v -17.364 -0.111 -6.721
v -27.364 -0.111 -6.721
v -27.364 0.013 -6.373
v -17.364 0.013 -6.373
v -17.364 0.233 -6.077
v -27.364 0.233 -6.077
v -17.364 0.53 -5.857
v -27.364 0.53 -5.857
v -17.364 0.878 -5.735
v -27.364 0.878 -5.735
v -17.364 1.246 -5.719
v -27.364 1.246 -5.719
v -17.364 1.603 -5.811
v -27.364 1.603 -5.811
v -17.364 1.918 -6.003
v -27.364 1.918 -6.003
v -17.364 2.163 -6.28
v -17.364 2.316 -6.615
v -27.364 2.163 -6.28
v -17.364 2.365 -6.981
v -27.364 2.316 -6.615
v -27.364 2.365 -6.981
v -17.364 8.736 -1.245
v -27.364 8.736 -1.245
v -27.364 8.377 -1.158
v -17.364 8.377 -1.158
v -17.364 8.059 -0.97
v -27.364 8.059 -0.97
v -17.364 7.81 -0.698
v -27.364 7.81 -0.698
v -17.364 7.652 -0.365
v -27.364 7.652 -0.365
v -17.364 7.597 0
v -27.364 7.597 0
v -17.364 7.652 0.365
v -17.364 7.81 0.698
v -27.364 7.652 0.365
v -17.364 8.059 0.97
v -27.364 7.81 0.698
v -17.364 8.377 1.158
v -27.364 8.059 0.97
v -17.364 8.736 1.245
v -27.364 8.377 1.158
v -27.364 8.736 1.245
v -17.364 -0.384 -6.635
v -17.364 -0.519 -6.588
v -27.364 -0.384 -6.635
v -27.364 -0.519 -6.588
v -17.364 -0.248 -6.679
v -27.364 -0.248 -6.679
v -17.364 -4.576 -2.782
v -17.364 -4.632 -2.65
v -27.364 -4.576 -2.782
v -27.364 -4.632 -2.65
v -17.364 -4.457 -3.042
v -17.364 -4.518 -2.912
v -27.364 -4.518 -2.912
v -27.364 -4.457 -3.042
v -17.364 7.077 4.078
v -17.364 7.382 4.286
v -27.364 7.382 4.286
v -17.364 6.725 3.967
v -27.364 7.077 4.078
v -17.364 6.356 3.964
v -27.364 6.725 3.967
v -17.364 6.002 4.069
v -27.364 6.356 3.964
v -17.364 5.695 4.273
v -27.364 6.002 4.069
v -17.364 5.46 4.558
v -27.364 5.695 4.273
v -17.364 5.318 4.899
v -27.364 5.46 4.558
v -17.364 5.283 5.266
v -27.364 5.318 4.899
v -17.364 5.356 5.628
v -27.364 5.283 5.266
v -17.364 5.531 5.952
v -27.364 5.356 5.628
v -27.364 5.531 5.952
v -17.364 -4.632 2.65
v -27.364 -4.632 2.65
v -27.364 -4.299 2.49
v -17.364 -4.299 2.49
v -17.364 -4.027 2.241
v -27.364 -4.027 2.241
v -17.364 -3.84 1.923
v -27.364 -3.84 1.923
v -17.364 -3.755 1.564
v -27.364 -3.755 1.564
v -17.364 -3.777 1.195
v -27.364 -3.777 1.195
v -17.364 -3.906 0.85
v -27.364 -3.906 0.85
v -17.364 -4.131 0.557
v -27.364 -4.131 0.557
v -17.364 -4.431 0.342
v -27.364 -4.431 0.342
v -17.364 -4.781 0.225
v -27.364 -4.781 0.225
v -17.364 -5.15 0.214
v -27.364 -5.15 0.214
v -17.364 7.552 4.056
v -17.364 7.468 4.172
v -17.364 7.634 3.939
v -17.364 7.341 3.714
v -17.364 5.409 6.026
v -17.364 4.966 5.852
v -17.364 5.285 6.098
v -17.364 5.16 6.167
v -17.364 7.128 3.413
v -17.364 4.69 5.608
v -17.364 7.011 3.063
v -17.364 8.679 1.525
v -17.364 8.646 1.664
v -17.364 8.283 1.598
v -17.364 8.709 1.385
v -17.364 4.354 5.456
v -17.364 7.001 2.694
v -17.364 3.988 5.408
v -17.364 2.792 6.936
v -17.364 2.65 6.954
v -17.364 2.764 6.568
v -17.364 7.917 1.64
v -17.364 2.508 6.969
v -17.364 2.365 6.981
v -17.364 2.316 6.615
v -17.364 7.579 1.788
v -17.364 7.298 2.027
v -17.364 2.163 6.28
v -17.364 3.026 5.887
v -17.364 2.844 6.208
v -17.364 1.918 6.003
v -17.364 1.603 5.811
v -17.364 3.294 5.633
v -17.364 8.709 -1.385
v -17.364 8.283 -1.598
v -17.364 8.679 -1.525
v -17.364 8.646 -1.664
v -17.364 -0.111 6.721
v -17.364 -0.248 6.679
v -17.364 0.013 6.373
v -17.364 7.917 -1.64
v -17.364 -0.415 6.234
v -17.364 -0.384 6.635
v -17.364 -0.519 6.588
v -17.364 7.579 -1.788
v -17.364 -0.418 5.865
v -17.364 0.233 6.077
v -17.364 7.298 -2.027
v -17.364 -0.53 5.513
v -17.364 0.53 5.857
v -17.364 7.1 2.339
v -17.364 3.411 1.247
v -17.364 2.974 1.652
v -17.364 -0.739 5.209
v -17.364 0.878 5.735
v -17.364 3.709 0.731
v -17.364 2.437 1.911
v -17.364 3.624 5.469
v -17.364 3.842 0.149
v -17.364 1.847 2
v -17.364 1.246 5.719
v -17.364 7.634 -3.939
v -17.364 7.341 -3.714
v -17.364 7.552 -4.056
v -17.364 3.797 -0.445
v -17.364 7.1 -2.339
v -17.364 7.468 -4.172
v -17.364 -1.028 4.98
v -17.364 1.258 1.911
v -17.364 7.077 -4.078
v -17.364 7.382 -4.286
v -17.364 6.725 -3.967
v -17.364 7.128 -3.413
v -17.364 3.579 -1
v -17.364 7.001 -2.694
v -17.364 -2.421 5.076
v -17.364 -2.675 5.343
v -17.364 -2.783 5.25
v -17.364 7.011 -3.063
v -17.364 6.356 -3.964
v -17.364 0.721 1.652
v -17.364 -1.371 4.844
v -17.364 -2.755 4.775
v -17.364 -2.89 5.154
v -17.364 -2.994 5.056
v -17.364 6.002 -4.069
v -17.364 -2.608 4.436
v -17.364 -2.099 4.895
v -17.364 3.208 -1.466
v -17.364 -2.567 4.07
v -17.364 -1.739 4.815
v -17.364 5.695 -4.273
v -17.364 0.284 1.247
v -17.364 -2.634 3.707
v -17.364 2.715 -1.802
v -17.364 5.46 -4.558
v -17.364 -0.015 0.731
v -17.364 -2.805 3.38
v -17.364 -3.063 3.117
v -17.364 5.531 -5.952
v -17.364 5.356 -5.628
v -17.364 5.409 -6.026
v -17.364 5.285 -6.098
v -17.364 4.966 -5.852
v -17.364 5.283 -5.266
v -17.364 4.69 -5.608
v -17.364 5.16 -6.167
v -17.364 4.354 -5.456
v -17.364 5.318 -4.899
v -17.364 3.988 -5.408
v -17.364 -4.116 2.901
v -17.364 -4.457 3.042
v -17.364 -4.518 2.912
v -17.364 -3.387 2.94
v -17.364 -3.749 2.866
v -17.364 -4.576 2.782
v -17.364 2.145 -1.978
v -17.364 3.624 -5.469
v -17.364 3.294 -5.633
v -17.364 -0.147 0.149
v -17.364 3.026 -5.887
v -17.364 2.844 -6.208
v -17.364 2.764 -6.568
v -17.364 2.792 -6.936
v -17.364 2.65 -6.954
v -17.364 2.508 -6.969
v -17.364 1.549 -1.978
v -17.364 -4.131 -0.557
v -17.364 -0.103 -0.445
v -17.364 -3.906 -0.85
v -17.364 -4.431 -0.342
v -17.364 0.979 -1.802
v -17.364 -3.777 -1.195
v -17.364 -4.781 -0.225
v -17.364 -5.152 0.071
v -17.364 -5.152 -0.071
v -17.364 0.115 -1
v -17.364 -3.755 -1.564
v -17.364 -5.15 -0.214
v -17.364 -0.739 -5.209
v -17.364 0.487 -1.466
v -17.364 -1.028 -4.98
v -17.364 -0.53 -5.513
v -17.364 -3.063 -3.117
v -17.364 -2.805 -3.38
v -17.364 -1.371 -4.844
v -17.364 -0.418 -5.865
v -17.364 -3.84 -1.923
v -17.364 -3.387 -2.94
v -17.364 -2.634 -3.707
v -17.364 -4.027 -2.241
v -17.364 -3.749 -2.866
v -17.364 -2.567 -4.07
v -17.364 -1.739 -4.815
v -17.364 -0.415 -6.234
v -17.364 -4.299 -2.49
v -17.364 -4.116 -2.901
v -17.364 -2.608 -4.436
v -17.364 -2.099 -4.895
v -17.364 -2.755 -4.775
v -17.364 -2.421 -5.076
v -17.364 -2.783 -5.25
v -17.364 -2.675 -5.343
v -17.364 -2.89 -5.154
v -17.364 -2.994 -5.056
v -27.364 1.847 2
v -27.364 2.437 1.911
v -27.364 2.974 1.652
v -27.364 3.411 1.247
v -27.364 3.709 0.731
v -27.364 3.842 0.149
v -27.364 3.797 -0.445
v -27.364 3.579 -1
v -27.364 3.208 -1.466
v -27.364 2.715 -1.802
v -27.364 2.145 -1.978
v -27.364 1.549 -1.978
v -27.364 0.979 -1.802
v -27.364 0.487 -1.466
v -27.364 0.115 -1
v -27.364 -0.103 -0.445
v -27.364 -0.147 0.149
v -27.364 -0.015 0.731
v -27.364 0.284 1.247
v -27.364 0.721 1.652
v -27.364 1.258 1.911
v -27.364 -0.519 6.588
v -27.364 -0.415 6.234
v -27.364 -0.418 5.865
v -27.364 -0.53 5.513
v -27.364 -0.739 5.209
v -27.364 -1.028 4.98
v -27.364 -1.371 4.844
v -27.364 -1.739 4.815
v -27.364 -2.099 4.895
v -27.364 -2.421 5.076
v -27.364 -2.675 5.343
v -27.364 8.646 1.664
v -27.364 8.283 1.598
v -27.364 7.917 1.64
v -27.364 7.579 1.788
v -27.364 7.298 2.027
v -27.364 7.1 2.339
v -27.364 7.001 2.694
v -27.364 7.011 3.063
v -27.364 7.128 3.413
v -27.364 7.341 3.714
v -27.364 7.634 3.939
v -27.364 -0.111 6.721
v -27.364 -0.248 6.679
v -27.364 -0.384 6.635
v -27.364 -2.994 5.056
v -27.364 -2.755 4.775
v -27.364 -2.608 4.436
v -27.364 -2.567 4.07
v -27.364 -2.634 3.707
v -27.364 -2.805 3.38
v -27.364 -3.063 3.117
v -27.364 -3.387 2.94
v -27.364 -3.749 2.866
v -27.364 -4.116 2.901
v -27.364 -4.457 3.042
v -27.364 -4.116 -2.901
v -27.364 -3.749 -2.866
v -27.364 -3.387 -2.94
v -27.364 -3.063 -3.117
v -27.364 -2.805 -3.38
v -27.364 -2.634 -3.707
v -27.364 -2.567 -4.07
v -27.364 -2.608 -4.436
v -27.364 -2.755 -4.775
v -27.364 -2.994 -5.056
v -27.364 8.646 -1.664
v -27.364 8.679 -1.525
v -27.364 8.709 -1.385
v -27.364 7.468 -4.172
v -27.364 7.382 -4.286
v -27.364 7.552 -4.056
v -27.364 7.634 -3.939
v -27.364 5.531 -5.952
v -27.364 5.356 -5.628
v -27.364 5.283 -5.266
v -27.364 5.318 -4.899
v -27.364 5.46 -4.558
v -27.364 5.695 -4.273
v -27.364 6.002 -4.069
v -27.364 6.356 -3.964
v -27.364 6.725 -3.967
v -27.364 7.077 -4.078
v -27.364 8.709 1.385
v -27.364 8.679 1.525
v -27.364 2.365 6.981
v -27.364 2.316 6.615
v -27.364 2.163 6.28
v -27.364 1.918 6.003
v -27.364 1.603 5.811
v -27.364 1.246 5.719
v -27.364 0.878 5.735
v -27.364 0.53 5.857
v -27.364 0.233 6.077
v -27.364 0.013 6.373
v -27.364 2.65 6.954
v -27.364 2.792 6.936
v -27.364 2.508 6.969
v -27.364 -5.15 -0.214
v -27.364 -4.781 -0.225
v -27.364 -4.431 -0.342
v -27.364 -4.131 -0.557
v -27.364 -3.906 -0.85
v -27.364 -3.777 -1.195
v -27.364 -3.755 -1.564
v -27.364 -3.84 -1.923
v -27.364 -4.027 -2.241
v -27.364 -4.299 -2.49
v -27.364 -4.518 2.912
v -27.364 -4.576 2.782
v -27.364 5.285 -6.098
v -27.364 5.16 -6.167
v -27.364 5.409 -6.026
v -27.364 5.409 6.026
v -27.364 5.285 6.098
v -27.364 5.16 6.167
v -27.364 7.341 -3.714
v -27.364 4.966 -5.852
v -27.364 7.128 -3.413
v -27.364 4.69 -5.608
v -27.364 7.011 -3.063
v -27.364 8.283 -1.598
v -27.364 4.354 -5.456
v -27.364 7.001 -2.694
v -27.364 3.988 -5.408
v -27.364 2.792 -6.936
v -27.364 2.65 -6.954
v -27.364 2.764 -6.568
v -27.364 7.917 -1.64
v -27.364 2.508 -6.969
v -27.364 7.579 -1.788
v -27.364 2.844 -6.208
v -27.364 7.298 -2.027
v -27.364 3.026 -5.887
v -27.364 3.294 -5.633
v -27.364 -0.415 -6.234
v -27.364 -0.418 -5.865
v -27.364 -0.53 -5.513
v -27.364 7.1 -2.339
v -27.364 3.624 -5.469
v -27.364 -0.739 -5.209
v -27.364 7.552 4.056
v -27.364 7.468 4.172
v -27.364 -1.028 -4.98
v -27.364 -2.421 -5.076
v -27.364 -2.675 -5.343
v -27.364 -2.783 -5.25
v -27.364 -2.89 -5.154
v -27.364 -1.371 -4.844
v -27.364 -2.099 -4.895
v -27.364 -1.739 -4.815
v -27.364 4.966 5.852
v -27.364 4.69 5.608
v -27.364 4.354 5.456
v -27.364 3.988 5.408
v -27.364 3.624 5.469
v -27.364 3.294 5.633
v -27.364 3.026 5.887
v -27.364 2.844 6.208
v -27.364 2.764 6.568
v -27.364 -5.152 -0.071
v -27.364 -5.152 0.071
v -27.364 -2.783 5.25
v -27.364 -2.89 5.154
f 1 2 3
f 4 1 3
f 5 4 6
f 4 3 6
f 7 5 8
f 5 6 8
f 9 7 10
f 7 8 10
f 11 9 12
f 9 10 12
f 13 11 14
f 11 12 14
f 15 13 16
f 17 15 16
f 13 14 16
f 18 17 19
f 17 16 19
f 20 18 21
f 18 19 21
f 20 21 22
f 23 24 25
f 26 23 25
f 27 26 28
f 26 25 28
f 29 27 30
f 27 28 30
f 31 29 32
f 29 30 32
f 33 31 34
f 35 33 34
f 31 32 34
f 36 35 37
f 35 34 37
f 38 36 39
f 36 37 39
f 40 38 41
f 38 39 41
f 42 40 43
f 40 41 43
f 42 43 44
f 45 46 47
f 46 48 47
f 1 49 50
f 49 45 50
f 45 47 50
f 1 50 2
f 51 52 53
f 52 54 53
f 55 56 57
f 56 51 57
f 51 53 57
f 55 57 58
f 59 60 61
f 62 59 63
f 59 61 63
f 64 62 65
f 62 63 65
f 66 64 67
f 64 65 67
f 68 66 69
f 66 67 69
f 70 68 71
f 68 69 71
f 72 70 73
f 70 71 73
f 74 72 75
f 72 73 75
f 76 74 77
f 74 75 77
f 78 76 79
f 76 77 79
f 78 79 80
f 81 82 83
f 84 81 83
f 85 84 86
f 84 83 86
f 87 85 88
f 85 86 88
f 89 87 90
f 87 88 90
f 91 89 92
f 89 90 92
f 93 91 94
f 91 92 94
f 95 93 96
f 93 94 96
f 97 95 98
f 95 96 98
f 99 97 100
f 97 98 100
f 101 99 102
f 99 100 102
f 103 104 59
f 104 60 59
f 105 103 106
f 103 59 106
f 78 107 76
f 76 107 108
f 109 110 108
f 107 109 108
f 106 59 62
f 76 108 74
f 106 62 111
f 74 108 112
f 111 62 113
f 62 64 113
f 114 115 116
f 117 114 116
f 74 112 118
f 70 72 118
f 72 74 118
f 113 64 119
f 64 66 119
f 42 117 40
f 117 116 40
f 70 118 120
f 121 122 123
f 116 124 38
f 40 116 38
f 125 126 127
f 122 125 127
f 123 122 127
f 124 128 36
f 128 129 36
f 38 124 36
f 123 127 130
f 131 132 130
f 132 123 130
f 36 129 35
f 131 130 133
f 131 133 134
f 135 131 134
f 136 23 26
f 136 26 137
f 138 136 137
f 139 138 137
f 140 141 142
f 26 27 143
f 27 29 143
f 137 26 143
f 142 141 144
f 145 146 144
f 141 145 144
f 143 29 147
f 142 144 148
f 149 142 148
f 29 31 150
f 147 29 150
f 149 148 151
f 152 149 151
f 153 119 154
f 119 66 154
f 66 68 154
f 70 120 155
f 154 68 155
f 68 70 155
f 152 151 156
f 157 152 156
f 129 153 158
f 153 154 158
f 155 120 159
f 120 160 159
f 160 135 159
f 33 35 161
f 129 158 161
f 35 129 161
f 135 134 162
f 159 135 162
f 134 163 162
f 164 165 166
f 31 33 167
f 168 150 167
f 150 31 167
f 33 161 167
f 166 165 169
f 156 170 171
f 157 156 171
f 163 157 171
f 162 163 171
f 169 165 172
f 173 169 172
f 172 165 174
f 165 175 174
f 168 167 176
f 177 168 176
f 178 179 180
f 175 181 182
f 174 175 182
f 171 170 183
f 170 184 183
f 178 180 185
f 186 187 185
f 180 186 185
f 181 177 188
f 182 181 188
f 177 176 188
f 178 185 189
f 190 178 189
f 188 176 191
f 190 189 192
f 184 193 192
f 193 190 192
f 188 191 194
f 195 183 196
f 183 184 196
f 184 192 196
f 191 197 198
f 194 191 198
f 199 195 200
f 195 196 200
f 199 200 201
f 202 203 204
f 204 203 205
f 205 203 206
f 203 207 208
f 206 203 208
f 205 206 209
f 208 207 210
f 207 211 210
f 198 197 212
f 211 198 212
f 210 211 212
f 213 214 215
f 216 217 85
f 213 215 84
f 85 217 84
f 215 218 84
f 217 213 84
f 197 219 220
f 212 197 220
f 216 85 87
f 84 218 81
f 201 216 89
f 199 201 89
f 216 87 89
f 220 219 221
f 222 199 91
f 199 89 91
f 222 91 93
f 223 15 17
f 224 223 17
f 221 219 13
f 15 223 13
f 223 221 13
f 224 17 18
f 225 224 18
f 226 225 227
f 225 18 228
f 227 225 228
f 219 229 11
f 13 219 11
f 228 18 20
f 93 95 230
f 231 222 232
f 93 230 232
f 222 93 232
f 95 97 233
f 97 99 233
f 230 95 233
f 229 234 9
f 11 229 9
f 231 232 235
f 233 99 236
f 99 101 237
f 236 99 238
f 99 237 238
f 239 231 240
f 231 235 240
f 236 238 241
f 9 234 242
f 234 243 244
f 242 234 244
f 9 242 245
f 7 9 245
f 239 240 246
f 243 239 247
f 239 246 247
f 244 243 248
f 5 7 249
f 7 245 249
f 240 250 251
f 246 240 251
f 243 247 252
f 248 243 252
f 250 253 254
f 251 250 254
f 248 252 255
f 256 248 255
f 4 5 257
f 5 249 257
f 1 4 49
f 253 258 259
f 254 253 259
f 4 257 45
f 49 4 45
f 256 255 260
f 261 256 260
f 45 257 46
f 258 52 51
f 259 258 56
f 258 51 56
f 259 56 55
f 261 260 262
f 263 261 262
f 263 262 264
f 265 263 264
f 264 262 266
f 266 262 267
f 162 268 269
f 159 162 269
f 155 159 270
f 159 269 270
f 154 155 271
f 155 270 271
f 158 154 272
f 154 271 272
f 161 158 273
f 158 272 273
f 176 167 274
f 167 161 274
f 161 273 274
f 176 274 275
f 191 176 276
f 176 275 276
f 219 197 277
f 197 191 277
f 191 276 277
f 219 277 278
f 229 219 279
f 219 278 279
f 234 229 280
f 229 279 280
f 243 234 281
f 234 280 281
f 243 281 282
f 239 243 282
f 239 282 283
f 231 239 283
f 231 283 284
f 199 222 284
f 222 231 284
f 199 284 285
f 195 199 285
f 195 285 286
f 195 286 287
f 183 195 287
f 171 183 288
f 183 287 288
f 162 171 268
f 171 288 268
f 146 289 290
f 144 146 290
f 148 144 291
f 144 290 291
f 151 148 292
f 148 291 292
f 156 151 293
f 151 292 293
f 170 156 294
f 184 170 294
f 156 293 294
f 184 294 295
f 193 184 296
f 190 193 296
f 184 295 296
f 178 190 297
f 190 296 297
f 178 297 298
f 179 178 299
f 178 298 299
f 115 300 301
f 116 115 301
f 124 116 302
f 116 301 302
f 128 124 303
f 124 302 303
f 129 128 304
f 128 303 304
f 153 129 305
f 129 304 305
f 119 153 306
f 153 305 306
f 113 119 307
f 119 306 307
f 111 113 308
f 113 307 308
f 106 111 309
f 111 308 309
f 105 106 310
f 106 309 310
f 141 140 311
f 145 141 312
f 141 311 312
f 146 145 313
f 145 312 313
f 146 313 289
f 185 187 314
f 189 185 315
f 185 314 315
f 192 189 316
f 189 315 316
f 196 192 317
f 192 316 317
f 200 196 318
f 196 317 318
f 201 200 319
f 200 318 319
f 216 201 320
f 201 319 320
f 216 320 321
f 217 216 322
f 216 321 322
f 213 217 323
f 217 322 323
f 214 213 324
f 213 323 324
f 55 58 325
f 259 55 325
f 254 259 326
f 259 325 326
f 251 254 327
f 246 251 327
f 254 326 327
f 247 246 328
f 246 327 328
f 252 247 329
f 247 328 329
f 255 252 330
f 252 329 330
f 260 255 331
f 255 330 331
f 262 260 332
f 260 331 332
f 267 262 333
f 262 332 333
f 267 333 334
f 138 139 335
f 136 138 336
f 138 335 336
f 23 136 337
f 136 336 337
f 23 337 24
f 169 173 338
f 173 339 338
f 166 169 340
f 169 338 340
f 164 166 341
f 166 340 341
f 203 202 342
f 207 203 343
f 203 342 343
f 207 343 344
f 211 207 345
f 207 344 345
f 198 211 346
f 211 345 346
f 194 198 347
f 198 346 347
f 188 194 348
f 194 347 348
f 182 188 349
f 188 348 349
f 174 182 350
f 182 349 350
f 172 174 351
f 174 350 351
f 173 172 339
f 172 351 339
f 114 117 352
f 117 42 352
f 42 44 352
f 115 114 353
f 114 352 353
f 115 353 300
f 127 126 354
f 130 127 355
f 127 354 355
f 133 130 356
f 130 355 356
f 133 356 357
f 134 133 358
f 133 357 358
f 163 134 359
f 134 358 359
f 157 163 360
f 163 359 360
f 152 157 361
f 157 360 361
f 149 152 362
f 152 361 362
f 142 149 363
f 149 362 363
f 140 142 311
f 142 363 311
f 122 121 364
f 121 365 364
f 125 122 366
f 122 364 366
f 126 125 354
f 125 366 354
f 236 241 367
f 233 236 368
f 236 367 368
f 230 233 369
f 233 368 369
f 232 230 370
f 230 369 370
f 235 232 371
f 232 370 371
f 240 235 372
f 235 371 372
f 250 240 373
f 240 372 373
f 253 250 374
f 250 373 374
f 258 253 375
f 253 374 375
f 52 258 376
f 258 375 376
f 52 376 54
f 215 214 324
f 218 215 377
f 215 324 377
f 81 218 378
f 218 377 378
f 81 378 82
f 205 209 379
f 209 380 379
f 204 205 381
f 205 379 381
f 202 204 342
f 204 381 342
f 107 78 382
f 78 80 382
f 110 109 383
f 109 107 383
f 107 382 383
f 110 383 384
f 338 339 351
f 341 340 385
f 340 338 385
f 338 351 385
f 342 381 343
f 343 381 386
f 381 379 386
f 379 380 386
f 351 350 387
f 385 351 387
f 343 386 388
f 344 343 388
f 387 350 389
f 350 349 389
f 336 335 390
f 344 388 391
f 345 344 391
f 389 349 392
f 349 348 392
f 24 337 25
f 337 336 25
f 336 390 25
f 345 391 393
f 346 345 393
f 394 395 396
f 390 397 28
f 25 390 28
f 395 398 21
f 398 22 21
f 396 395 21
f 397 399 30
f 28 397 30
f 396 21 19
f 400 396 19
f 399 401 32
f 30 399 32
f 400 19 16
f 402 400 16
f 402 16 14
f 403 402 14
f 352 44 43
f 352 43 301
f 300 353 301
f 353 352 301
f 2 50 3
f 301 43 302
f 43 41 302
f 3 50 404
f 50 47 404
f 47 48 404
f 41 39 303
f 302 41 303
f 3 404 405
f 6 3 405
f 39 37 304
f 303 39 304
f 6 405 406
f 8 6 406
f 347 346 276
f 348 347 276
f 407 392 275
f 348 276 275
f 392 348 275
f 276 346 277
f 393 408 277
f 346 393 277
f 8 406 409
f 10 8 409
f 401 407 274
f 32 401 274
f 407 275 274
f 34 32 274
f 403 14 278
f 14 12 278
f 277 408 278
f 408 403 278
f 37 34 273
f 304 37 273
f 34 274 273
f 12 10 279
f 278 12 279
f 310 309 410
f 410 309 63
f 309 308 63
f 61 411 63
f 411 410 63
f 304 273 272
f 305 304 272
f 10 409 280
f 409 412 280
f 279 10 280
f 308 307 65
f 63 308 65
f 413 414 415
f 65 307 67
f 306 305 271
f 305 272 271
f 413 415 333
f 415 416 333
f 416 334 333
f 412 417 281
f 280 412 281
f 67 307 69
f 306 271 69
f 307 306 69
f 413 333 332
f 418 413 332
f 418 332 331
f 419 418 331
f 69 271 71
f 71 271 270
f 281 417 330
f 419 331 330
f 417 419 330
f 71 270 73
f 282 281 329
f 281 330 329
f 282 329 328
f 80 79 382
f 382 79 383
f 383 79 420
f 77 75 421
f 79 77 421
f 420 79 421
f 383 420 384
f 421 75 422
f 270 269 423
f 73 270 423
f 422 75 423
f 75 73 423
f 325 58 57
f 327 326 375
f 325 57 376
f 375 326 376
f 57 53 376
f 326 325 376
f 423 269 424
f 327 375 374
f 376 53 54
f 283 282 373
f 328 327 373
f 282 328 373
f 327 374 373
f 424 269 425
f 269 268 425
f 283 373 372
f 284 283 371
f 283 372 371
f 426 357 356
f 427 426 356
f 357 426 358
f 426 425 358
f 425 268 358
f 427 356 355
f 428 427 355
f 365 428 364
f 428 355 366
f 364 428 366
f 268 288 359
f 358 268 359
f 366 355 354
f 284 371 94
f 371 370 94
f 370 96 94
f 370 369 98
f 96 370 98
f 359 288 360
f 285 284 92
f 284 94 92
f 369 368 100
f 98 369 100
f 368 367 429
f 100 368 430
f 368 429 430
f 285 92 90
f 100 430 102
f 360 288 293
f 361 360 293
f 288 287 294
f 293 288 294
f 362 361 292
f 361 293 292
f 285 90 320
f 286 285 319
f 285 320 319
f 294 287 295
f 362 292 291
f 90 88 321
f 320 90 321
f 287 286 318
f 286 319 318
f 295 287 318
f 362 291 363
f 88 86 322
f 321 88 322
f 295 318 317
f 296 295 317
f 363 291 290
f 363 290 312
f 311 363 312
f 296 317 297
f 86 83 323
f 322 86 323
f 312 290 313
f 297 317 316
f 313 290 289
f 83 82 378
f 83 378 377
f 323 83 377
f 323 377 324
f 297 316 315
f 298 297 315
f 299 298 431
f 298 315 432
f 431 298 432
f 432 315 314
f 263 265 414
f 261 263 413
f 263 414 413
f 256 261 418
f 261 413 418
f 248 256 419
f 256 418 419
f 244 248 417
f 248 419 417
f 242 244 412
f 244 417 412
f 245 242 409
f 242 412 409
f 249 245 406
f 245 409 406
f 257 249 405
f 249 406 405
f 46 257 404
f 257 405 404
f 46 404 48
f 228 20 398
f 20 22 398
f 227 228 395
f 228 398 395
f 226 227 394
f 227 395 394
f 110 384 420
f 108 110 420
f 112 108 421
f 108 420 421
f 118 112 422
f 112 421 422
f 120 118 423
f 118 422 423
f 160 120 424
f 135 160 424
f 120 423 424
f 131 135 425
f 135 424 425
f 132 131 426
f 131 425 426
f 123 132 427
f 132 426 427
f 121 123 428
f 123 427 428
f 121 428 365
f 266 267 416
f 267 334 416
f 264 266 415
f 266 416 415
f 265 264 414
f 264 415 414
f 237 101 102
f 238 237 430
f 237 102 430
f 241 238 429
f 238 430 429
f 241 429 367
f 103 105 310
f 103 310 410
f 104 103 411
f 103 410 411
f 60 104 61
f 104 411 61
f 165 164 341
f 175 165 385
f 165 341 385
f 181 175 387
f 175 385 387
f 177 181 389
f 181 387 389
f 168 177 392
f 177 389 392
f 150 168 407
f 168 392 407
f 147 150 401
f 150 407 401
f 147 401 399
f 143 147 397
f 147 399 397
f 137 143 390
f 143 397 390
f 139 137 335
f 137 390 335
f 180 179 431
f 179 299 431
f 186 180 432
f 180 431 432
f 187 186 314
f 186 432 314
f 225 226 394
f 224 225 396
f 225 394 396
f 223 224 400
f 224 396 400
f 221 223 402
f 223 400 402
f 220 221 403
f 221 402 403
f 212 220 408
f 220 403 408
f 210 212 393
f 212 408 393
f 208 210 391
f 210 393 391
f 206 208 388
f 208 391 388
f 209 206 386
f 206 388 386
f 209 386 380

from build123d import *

# Parameters (mm, degrees)
SKETCH_3_R               = 2
CUT_EXTRUDE_2_DEPTH      = 17
SKETCH_4_W               = 2.5
SKETCH_4_H               = 2.683329606
CUT_EXTRUDE_3_DEPTH      = 17
PATTERN_CIRCULAR_1_COUNT = 15


with BuildPart() as part:
    # 草图1 → 旋转2 (revolve)
    with BuildSketch(Plane.XY, mode=Mode.PRIVATE) as revolve_2_sk:
        Polygon((-27.363734917, 8.847191366), (-27.363734917, 3.847191366), (-28.613734917, 3.847191366), (-28.613734917, 1.847191366), (-16.113734917, 1.847191366), (-16.113734917, 3.847191366), (-17.363734917, 3.847191366), (-17.363734917, 8.847191366), align=None)
    revolve(revolve_2_sk.sketch.rotate(Axis((-48.964491856, 1.847191366, 0), (1, 0, 0)), 90), axis=Axis((-48.964491856, 1.847191366, 0), (1, 0, 0)))

    # 草图3 → 切除-拉伸2 (cut)
    with BuildSketch(Plane.ZY.offset(28.613734917)):
        with Locations((0, 1.847191366)):
            Circle(SKETCH_3_R)
    extrude(amount=-CUT_EXTRUDE_2_DEPTH, mode=Mode.SUBTRACT)

    # 草图4 → 切除-拉伸3 (cut)
    with BuildSketch(Plane.ZY.offset(27.363734917)):
        with Locations((0, 10.188856169)):
            Rectangle(SKETCH_4_W, SKETCH_4_H)
        with BuildLine():
            Line((1.25, 8.847191366), (-1.25, 8.847191366))
            ThreePointArc((-1.25, 8.847191366), (0, 7.597191366), (1.25, 8.847191366))
        make_face()
    cut_extrude_3 = extrude(amount=-CUT_EXTRUDE_3_DEPTH, mode=Mode.SUBTRACT)

    # 阵列(圆周)1: 切除-拉伸3 ×15 about axis
    pattern_circular_1_axis = Axis((0, 1.847191366, 0), (1, 0, 0))
    for i in range(1, PATTERN_CIRCULAR_1_COUNT):
        add(cut_extrude_3.rotate(pattern_circular_1_axis, i * 360 / PATTERN_CIRCULAR_1_COUNT), mode=Mode.SUBTRACT)


solid = part.part
